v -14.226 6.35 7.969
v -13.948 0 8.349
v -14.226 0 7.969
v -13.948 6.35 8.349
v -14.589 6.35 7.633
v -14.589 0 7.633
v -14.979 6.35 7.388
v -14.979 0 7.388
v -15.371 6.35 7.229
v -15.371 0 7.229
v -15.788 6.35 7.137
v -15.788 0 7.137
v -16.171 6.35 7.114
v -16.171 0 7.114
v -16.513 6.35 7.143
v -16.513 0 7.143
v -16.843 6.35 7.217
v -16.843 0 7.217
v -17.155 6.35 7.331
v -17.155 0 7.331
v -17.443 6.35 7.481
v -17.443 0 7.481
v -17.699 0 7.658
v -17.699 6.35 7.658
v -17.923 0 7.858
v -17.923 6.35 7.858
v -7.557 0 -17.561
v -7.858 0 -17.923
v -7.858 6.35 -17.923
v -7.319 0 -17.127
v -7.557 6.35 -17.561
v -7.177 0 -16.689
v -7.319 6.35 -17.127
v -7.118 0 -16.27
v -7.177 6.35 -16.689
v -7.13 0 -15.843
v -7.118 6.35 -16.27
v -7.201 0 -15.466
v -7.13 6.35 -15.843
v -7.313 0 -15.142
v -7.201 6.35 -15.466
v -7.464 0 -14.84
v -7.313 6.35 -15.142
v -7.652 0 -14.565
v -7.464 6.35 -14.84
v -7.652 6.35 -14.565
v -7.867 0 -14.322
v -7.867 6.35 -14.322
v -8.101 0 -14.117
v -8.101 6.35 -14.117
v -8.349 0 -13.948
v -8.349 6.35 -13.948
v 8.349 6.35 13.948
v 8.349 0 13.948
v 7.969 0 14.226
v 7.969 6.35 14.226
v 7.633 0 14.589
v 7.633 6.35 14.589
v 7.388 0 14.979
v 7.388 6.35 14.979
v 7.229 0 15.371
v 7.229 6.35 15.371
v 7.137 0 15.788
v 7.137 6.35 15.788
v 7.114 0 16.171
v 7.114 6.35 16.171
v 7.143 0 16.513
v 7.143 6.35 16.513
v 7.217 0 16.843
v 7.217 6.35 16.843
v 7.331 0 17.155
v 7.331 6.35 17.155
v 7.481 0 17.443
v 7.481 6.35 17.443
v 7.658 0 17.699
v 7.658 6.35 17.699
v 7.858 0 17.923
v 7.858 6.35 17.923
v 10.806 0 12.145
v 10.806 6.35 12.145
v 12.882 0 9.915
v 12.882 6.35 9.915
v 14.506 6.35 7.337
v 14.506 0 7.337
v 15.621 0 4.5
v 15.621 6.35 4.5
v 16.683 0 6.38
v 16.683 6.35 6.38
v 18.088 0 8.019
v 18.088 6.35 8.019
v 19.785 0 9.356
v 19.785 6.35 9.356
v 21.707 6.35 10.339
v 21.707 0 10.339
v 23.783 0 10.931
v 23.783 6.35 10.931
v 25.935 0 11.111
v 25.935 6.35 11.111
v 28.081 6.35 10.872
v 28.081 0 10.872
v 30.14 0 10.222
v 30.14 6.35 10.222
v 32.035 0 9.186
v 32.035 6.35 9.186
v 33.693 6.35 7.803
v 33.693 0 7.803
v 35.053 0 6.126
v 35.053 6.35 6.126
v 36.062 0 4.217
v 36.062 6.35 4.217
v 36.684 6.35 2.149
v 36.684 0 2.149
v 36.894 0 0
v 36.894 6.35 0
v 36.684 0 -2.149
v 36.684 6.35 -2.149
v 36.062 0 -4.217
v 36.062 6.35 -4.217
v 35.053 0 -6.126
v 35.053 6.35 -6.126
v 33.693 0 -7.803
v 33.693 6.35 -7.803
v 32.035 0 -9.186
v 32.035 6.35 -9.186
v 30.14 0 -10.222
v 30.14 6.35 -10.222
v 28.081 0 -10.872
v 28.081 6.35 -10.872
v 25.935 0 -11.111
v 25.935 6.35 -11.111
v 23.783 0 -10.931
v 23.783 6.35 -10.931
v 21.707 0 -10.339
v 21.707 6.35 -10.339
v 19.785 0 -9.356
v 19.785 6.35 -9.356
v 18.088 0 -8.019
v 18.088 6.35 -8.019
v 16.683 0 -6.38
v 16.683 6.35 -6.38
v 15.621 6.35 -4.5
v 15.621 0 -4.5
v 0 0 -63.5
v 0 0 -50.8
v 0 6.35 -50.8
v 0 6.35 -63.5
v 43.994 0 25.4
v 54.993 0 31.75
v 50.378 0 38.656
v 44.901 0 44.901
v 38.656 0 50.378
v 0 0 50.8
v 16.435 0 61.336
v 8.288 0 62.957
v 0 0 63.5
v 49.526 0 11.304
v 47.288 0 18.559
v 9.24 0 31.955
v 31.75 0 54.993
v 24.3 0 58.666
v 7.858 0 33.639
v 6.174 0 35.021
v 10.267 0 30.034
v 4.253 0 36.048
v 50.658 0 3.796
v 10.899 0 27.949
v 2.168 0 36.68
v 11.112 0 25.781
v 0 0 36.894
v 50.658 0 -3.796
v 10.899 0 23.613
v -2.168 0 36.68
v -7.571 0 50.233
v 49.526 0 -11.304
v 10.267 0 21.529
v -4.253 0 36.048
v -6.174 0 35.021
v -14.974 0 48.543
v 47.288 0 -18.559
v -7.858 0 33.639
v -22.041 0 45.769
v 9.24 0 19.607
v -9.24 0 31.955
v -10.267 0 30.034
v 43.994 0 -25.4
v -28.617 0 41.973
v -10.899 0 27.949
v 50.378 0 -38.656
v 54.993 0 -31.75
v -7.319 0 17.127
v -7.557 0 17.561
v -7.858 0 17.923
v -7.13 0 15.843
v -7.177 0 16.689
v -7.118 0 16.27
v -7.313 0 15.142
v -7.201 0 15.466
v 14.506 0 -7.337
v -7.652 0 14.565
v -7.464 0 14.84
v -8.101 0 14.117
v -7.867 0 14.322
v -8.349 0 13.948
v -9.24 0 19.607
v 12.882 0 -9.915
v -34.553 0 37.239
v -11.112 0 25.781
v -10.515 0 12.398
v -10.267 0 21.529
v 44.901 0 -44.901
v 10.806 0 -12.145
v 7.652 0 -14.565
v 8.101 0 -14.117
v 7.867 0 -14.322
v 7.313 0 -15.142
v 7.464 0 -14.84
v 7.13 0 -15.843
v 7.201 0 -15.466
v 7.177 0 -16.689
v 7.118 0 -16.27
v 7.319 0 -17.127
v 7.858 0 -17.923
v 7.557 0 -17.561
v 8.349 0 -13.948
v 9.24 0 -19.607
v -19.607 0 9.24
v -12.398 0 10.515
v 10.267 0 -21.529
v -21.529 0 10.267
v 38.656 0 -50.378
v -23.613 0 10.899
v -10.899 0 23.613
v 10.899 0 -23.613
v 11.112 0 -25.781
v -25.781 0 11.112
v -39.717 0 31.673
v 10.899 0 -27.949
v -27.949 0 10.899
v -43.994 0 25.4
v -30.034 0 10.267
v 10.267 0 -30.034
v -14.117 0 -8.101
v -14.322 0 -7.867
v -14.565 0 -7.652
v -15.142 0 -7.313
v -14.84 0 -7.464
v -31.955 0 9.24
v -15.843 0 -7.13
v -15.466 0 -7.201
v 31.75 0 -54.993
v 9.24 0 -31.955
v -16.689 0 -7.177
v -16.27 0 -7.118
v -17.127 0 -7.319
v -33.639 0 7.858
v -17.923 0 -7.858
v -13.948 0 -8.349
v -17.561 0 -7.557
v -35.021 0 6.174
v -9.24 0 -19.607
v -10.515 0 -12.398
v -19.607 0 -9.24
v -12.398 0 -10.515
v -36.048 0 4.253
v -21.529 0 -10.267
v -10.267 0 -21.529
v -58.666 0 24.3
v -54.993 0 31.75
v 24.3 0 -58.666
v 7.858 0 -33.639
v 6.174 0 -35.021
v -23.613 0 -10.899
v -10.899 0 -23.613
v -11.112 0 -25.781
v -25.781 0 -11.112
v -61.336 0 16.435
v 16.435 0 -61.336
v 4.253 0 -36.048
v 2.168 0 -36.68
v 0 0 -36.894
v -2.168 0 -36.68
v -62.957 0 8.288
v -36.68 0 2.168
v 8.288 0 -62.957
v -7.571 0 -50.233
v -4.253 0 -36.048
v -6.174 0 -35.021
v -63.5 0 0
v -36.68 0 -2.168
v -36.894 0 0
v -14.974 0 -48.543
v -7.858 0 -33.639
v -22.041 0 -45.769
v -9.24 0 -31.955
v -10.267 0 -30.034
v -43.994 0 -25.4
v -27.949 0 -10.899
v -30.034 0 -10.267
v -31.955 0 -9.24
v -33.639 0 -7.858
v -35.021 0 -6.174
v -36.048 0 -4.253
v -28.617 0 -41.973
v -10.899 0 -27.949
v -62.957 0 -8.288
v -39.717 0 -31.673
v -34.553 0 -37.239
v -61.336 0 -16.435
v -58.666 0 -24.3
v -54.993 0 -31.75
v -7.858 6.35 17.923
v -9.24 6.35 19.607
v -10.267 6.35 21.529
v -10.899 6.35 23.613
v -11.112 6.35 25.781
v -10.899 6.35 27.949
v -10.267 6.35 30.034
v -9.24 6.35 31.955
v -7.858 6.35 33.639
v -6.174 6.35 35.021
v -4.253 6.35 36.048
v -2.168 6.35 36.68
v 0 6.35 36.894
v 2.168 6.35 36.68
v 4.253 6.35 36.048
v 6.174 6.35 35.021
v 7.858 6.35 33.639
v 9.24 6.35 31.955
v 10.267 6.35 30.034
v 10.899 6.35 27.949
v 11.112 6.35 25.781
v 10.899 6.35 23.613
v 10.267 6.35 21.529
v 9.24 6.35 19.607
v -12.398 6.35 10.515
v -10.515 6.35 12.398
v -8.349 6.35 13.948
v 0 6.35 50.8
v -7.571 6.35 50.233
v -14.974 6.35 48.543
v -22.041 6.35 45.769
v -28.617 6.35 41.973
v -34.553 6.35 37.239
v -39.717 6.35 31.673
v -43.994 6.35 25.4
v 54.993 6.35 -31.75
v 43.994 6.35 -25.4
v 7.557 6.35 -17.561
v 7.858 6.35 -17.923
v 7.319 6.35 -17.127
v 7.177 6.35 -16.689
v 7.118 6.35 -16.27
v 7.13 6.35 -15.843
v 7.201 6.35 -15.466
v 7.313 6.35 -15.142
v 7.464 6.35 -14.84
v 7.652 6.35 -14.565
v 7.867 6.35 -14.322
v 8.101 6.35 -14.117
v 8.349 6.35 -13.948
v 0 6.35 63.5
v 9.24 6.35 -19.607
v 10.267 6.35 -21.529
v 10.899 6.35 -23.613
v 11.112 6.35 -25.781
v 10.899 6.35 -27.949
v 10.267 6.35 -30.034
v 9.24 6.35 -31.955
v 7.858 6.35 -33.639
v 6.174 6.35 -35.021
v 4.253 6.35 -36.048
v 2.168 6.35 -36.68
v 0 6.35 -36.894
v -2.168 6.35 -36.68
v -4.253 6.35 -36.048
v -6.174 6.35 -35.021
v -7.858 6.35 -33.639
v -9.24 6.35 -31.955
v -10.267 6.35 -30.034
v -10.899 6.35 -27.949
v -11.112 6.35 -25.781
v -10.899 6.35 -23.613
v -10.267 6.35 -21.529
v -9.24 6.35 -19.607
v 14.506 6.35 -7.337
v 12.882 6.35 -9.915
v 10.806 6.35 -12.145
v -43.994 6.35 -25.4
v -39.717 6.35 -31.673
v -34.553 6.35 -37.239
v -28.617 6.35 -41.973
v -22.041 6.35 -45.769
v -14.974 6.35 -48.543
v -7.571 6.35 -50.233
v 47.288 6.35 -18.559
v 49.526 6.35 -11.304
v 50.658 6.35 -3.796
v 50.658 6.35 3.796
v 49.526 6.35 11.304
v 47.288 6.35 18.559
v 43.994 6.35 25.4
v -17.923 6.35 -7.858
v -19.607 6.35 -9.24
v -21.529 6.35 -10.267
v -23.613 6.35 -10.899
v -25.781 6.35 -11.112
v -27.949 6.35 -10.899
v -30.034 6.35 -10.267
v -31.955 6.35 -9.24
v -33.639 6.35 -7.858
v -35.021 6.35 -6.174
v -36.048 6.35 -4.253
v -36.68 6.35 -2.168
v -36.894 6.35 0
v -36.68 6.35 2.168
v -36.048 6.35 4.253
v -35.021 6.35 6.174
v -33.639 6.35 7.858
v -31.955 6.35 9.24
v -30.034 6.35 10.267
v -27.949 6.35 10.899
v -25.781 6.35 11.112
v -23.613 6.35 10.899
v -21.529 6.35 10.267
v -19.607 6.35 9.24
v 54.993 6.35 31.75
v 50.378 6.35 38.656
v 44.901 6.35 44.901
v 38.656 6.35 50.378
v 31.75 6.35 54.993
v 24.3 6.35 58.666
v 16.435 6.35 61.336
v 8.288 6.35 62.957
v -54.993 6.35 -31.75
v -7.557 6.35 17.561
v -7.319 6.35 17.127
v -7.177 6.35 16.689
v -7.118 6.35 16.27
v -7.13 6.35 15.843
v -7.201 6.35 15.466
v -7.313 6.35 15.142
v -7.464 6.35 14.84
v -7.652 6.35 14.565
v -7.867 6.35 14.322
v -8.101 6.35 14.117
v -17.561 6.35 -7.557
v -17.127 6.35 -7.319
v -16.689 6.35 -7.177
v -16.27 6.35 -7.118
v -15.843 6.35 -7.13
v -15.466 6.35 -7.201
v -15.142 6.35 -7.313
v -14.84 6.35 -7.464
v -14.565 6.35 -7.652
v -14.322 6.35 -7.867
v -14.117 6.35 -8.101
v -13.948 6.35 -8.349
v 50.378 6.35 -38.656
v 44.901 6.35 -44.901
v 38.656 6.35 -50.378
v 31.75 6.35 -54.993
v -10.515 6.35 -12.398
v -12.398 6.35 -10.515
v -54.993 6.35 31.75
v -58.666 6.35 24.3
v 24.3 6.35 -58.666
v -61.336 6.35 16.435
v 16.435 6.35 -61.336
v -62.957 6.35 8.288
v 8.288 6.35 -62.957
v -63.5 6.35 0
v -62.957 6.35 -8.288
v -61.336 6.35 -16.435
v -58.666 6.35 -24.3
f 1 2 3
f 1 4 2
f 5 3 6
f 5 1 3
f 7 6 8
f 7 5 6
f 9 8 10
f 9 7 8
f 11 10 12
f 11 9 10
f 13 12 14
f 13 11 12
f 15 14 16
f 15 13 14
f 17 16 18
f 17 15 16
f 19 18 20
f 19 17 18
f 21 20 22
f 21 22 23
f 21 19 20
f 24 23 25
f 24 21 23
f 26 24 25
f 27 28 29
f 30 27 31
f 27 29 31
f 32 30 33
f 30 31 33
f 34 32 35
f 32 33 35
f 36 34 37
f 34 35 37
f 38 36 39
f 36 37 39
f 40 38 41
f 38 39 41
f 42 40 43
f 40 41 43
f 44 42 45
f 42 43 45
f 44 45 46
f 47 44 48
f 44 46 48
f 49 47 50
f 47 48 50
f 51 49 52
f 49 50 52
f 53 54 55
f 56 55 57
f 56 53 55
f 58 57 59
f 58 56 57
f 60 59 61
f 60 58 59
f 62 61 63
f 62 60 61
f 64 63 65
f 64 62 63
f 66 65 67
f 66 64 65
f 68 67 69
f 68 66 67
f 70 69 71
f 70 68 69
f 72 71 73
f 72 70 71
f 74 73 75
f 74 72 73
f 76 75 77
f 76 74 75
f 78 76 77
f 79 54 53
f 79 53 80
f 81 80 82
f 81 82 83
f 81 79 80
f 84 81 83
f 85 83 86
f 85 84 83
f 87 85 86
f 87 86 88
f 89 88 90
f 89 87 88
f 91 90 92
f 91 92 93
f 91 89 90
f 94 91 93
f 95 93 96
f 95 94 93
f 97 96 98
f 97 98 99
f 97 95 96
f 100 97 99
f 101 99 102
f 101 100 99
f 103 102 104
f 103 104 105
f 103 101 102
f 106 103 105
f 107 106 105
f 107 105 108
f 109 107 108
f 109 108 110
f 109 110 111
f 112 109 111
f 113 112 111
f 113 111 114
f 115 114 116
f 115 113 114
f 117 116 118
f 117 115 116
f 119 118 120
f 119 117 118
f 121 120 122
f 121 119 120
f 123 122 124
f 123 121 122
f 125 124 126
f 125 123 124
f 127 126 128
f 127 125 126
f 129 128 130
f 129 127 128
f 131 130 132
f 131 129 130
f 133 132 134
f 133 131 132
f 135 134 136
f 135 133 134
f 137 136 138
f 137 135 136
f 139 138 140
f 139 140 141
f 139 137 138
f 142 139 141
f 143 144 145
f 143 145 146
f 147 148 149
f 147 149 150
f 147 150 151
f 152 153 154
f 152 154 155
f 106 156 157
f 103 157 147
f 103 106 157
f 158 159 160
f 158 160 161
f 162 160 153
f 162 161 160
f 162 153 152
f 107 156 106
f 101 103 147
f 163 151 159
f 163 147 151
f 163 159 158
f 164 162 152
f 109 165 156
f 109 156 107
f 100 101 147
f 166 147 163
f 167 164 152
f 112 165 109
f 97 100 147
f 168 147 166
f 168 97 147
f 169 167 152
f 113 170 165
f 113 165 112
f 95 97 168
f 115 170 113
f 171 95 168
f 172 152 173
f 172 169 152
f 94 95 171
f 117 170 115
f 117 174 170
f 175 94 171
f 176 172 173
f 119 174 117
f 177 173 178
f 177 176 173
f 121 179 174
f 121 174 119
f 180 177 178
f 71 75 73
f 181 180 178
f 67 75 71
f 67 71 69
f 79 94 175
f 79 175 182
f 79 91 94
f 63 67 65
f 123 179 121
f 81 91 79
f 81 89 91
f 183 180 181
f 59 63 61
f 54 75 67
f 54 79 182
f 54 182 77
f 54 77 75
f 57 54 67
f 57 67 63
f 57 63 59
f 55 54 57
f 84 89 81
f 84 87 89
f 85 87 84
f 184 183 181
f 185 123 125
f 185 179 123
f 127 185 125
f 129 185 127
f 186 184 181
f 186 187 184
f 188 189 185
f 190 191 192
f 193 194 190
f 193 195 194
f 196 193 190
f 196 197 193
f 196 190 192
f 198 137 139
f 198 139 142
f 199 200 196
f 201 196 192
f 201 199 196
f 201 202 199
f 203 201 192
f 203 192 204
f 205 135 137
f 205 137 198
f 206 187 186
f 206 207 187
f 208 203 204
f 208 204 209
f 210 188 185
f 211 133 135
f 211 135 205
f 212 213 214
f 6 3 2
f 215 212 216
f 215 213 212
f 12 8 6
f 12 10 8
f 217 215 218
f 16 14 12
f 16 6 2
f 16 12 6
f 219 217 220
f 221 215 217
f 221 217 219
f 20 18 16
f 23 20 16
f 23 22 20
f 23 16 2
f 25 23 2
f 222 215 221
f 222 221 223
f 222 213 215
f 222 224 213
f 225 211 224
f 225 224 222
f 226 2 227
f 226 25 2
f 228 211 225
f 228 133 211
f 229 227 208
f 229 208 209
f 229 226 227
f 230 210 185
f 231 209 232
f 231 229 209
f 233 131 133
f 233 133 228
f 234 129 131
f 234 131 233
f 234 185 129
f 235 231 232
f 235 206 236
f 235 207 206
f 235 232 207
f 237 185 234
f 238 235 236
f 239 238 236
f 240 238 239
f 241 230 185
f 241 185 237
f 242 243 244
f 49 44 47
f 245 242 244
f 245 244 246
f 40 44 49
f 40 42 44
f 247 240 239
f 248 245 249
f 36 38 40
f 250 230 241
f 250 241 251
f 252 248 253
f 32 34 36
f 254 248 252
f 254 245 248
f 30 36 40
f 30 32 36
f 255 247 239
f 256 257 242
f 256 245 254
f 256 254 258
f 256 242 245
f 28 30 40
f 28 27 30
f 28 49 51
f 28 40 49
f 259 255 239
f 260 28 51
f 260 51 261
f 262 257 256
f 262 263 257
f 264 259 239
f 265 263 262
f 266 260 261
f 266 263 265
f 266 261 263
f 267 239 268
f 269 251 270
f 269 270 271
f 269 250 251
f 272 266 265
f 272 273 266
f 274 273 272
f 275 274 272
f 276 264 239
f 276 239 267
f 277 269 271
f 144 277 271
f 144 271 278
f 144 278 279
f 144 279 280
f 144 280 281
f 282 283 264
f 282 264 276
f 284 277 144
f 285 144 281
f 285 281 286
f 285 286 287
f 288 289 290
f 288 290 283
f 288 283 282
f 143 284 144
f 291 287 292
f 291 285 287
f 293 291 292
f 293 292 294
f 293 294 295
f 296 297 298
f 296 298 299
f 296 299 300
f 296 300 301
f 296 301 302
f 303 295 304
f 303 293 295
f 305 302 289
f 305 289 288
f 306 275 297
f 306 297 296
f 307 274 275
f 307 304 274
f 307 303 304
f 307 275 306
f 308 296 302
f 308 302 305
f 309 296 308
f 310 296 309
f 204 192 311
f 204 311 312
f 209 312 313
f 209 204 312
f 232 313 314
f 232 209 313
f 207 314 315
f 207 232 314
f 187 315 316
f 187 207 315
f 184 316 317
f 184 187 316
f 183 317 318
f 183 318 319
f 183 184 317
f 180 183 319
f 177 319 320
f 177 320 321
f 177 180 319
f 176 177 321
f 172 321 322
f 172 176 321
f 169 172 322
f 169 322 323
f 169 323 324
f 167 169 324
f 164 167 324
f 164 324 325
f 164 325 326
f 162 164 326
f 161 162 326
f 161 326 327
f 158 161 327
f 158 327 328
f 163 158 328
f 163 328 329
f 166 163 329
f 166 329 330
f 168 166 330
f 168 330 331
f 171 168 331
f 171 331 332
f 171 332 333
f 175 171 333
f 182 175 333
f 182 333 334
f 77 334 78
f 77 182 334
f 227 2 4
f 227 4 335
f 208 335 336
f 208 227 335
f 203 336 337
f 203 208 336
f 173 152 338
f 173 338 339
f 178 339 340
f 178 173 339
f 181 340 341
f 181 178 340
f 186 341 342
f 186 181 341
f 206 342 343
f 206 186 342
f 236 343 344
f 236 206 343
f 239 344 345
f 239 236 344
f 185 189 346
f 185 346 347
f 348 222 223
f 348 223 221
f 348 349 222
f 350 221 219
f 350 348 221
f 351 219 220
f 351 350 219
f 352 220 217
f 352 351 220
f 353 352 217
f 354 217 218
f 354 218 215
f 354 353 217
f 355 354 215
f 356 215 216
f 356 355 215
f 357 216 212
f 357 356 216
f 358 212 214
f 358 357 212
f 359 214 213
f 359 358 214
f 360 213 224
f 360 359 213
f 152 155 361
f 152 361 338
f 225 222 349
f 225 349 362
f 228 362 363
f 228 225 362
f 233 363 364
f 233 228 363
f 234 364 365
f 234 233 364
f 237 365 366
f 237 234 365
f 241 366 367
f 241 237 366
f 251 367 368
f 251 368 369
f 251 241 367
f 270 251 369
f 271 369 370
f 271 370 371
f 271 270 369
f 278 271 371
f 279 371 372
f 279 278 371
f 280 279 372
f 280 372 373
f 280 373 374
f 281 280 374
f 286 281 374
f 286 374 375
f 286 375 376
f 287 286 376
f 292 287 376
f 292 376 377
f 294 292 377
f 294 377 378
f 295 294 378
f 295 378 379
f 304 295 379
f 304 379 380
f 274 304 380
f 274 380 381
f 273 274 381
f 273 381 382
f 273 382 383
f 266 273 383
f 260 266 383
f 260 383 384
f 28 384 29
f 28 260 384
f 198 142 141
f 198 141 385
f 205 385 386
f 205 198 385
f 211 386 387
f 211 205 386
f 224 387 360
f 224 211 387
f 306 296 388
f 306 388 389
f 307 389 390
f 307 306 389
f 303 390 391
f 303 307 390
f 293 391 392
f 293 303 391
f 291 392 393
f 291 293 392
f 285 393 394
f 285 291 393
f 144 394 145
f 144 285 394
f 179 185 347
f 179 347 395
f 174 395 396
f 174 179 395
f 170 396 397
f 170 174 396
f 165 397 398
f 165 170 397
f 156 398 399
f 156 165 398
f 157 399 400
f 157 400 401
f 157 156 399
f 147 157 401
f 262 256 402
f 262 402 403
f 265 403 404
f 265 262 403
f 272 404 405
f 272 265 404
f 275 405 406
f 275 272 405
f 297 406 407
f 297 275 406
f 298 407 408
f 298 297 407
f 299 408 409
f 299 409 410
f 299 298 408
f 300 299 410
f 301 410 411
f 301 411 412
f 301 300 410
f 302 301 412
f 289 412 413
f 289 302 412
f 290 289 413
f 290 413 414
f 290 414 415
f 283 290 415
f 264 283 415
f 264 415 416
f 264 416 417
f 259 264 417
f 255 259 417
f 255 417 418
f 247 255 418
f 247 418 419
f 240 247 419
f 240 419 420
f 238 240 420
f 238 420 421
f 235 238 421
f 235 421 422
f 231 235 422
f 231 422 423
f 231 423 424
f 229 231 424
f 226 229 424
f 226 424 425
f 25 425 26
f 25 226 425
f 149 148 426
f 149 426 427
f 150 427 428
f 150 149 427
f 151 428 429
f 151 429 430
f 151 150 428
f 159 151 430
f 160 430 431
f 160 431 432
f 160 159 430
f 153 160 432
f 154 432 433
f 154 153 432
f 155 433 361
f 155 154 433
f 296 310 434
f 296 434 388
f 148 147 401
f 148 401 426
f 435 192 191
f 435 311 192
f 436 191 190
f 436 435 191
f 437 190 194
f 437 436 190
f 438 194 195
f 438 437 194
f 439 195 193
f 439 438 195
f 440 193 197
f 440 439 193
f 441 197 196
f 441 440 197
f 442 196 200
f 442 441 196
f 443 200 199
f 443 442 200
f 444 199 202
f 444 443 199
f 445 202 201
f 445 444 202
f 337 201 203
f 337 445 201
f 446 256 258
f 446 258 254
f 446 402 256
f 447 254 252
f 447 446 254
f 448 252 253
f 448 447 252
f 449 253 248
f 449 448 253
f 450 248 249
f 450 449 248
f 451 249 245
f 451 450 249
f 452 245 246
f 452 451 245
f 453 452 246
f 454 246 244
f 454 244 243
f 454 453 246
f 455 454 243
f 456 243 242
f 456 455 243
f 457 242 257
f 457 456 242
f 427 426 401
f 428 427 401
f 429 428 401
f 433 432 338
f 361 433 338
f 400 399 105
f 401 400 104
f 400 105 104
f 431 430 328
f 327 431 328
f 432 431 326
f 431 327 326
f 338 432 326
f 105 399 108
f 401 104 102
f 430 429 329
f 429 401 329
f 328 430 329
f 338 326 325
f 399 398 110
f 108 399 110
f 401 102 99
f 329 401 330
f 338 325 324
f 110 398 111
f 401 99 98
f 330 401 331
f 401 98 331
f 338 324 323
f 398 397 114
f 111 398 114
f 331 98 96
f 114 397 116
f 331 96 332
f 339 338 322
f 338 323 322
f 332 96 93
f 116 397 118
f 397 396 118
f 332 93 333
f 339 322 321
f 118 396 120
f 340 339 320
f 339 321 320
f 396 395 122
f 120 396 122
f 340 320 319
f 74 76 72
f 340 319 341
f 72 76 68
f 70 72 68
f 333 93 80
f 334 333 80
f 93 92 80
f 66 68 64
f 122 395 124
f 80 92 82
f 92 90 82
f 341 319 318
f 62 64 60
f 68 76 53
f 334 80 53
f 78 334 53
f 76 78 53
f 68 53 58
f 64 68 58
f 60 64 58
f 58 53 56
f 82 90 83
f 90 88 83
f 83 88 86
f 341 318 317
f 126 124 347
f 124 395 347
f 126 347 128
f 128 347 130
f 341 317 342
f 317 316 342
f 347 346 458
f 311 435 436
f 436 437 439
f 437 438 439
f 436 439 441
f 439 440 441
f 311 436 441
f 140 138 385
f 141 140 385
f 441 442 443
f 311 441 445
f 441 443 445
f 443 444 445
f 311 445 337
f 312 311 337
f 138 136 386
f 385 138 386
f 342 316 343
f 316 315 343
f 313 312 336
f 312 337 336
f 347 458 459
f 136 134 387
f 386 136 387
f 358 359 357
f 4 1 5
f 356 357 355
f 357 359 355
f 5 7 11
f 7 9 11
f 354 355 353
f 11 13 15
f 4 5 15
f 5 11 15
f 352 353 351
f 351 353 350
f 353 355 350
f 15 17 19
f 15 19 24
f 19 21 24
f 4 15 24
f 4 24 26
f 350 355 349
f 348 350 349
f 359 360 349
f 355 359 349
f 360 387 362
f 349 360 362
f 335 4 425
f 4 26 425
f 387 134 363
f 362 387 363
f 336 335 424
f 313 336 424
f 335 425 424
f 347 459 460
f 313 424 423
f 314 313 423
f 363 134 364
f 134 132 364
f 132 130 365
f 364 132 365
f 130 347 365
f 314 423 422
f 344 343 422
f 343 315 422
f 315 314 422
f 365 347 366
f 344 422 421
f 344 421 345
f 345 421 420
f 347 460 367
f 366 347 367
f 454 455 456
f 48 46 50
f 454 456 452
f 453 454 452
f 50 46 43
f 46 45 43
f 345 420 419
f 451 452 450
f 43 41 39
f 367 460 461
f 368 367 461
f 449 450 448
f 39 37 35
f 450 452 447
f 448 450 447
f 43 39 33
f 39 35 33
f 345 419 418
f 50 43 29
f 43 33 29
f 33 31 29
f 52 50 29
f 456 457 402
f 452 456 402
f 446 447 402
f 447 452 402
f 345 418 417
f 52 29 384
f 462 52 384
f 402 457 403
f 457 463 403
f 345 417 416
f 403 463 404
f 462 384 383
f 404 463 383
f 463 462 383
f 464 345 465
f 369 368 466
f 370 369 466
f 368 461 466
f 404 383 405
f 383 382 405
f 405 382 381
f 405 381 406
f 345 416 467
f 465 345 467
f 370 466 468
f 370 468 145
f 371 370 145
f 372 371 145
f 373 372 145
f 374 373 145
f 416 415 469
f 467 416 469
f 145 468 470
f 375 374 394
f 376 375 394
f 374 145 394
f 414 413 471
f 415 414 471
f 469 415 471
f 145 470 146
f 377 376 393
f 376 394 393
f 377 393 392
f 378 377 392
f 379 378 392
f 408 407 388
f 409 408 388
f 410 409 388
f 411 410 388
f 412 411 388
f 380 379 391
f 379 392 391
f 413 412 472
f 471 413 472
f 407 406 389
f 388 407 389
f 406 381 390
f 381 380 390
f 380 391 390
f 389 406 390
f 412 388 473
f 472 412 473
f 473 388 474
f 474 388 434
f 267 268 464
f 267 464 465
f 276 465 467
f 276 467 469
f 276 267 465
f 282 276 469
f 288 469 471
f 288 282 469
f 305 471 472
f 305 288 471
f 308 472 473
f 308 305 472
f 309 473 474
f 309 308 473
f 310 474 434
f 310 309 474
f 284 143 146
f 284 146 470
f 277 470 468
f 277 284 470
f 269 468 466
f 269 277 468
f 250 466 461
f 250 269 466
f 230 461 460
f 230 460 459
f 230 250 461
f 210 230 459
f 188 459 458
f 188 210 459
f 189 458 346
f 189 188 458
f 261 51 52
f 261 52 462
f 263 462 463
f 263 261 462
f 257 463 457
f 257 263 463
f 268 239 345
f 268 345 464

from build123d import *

# Parameters (mm, degrees)
BOSS_EXTRUDE1_DEPTH = 6.35
FILLET1_R           = 2.54


with BuildPart() as part:
    # Sketch1 → Boss-Extrude1 (new body)
    with BuildSketch(Plane(origin=(0, 0, 0), x_dir=(1, 0, 0), z_dir=(0, 1, 0))):
        with BuildLine():
            Line((0, 50.8), (0, 63.5))
            ThreePointArc((0, 63.5), (31.75, 54.99261314), (54.99261314, 31.75))
            Line((54.99261314, 31.75), (43.994090512, 25.4))
            ThreePointArc((43.994090512, 25.4), (50.8, 0), (43.994090512, -25.4))
            Line((43.994090512, -25.4), (54.99261314, -31.75))
            ThreePointArc((54.99261314, -31.75), (31.75, -54.99261314), (0, -63.5))
            Line((0, -63.5), (0, -50.8))
            ThreePointArc((0, -50.8), (-25.4, -43.994090512), (-43.994090512, -25.4))
            Line((-43.994090512, -25.4), (-54.99261314, -31.75))
            ThreePointArc((-54.99261314, -31.75), (-63.5, 0), (-54.99261314, 31.75))
            Line((-54.99261314, 31.75), (-43.994090512, 25.4))
            ThreePointArc((-43.994090512, 25.4), (-25.4, 43.994090512), (0, 50.8))
        make_face()
        with BuildLine():
            ThreePointArc((-4.50045673, 15.62060899), (-11.494727835, 11.494727835), (-15.62060899, 4.50045673))
            ThreePointArc((-15.62060899, 4.50045673), (-36.8935, 0), (-15.62060899, -4.50045673))
            ThreePointArc((-15.62060899, -4.50045673), (-11.494727835, -11.494727835), (-4.50045673, -15.62060899))
            ThreePointArc((-4.50045673, -15.62060899), (0, -36.8935), (4.50045673, -15.62060899))
            ThreePointArc((4.50045673, -15.62060899), (11.494727835, -11.494727835), (15.62060899, -4.50045673))
            ThreePointArc((15.62060899, -4.50045673), (36.8935, 0), (15.62060899, 4.50045673))
            ThreePointArc((15.62060899, 4.50045673), (11.494727835, 11.494727835), (4.50045673, 15.62060899))
            ThreePointArc((4.50045673, 15.62060899), (0, 36.8935), (-4.50045673, 15.62060899))
        make_face(mode=Mode.SUBTRACT)
    extrude(amount=BOSS_EXTRUDE1_DEPTH)

    # Fillet1
    fillet1_edges = [part.edges().sort_by_distance(p)[0] for p in [
        (4.50045673, 3.175, -15.62060899),
        (-4.50045673, 3.175, -15.62060899),
        (-15.62060899, 3.175, -4.50045673),
        (-15.62060899, 3.175, 4.50045673),
        (-4.50045673, 3.175, 15.62060899),
        (4.50045673, 3.175, 15.62060899),
    ]]
    fillet(fillet1_edges, radius=FILLET1_R)


solid = part.part
